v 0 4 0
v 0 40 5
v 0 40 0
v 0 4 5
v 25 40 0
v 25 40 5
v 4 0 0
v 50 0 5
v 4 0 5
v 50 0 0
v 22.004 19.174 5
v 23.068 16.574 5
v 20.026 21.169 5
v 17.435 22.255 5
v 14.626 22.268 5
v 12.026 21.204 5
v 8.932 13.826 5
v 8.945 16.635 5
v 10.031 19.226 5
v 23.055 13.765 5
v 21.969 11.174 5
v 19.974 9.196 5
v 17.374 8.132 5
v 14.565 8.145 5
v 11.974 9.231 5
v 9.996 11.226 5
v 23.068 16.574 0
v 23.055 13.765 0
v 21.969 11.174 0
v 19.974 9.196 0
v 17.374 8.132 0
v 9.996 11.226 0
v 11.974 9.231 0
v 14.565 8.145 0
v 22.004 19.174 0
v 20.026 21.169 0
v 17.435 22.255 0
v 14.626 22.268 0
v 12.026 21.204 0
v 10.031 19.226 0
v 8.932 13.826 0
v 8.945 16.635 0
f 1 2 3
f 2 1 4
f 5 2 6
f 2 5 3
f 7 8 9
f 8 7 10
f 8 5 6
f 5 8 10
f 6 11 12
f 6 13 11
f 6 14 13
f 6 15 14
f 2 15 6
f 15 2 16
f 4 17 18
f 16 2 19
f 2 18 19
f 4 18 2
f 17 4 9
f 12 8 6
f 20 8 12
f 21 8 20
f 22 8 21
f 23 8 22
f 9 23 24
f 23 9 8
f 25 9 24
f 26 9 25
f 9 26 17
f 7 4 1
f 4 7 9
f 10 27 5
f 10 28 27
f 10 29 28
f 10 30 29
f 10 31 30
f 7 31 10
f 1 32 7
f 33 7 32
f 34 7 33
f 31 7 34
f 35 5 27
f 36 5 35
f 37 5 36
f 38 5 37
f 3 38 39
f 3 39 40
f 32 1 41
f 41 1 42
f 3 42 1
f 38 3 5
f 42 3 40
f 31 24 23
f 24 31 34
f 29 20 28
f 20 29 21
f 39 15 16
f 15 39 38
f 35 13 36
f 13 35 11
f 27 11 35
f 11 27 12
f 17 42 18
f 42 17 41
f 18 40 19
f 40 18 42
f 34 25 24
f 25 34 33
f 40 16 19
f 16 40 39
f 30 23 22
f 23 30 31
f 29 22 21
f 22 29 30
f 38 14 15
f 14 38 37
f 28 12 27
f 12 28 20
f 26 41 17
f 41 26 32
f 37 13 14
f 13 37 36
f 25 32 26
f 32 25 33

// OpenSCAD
$fn = 32;

// ----------------------------------------------------------------------
// Bracket plate: gusset 50 x 40
// ----------------------------------------------------------------------

// --- parameters (mm) ---
hole_r = 4;               // bolt hole radius
plate_t = 5;              // plate thickness, Z (extrusion height)
gus_a = 50;               // base length
gus_b = 40;               // height
top_x = 25;               // top edge X of the angled cut
light_r = 7.2;            // lightening hole radius

light_d = 2 * light_r;

profile = [[4, 0], [25, 0], [50, 0], [25, 40], [0, 40], [0, 4]];  // primary outline, 6 points, counter clockwise
void_1 = [[23.068, 16.574], [22.004, 19.174], [20.026, 21.169], [17.435, 22.255], [14.626, 22.268], [12.026, 21.204], [10.031, 19.226], [8.945, 16.635], [8.932, 13.826], [9.996, 11.226], [11.974, 9.231], [14.565, 8.145], [17.374, 8.132], [19.974, 9.196], [21.969, 11.174], [23.055, 13.765]];  // lightening hole, 16 points

// --- the one profile operation ---
difference() {
  linear_extrude(height = plate_t) polygon(points = profile);
  translate([0, 0, -1])
    linear_extrude(height = plate_t + 2) polygon(points = void_1);
}
